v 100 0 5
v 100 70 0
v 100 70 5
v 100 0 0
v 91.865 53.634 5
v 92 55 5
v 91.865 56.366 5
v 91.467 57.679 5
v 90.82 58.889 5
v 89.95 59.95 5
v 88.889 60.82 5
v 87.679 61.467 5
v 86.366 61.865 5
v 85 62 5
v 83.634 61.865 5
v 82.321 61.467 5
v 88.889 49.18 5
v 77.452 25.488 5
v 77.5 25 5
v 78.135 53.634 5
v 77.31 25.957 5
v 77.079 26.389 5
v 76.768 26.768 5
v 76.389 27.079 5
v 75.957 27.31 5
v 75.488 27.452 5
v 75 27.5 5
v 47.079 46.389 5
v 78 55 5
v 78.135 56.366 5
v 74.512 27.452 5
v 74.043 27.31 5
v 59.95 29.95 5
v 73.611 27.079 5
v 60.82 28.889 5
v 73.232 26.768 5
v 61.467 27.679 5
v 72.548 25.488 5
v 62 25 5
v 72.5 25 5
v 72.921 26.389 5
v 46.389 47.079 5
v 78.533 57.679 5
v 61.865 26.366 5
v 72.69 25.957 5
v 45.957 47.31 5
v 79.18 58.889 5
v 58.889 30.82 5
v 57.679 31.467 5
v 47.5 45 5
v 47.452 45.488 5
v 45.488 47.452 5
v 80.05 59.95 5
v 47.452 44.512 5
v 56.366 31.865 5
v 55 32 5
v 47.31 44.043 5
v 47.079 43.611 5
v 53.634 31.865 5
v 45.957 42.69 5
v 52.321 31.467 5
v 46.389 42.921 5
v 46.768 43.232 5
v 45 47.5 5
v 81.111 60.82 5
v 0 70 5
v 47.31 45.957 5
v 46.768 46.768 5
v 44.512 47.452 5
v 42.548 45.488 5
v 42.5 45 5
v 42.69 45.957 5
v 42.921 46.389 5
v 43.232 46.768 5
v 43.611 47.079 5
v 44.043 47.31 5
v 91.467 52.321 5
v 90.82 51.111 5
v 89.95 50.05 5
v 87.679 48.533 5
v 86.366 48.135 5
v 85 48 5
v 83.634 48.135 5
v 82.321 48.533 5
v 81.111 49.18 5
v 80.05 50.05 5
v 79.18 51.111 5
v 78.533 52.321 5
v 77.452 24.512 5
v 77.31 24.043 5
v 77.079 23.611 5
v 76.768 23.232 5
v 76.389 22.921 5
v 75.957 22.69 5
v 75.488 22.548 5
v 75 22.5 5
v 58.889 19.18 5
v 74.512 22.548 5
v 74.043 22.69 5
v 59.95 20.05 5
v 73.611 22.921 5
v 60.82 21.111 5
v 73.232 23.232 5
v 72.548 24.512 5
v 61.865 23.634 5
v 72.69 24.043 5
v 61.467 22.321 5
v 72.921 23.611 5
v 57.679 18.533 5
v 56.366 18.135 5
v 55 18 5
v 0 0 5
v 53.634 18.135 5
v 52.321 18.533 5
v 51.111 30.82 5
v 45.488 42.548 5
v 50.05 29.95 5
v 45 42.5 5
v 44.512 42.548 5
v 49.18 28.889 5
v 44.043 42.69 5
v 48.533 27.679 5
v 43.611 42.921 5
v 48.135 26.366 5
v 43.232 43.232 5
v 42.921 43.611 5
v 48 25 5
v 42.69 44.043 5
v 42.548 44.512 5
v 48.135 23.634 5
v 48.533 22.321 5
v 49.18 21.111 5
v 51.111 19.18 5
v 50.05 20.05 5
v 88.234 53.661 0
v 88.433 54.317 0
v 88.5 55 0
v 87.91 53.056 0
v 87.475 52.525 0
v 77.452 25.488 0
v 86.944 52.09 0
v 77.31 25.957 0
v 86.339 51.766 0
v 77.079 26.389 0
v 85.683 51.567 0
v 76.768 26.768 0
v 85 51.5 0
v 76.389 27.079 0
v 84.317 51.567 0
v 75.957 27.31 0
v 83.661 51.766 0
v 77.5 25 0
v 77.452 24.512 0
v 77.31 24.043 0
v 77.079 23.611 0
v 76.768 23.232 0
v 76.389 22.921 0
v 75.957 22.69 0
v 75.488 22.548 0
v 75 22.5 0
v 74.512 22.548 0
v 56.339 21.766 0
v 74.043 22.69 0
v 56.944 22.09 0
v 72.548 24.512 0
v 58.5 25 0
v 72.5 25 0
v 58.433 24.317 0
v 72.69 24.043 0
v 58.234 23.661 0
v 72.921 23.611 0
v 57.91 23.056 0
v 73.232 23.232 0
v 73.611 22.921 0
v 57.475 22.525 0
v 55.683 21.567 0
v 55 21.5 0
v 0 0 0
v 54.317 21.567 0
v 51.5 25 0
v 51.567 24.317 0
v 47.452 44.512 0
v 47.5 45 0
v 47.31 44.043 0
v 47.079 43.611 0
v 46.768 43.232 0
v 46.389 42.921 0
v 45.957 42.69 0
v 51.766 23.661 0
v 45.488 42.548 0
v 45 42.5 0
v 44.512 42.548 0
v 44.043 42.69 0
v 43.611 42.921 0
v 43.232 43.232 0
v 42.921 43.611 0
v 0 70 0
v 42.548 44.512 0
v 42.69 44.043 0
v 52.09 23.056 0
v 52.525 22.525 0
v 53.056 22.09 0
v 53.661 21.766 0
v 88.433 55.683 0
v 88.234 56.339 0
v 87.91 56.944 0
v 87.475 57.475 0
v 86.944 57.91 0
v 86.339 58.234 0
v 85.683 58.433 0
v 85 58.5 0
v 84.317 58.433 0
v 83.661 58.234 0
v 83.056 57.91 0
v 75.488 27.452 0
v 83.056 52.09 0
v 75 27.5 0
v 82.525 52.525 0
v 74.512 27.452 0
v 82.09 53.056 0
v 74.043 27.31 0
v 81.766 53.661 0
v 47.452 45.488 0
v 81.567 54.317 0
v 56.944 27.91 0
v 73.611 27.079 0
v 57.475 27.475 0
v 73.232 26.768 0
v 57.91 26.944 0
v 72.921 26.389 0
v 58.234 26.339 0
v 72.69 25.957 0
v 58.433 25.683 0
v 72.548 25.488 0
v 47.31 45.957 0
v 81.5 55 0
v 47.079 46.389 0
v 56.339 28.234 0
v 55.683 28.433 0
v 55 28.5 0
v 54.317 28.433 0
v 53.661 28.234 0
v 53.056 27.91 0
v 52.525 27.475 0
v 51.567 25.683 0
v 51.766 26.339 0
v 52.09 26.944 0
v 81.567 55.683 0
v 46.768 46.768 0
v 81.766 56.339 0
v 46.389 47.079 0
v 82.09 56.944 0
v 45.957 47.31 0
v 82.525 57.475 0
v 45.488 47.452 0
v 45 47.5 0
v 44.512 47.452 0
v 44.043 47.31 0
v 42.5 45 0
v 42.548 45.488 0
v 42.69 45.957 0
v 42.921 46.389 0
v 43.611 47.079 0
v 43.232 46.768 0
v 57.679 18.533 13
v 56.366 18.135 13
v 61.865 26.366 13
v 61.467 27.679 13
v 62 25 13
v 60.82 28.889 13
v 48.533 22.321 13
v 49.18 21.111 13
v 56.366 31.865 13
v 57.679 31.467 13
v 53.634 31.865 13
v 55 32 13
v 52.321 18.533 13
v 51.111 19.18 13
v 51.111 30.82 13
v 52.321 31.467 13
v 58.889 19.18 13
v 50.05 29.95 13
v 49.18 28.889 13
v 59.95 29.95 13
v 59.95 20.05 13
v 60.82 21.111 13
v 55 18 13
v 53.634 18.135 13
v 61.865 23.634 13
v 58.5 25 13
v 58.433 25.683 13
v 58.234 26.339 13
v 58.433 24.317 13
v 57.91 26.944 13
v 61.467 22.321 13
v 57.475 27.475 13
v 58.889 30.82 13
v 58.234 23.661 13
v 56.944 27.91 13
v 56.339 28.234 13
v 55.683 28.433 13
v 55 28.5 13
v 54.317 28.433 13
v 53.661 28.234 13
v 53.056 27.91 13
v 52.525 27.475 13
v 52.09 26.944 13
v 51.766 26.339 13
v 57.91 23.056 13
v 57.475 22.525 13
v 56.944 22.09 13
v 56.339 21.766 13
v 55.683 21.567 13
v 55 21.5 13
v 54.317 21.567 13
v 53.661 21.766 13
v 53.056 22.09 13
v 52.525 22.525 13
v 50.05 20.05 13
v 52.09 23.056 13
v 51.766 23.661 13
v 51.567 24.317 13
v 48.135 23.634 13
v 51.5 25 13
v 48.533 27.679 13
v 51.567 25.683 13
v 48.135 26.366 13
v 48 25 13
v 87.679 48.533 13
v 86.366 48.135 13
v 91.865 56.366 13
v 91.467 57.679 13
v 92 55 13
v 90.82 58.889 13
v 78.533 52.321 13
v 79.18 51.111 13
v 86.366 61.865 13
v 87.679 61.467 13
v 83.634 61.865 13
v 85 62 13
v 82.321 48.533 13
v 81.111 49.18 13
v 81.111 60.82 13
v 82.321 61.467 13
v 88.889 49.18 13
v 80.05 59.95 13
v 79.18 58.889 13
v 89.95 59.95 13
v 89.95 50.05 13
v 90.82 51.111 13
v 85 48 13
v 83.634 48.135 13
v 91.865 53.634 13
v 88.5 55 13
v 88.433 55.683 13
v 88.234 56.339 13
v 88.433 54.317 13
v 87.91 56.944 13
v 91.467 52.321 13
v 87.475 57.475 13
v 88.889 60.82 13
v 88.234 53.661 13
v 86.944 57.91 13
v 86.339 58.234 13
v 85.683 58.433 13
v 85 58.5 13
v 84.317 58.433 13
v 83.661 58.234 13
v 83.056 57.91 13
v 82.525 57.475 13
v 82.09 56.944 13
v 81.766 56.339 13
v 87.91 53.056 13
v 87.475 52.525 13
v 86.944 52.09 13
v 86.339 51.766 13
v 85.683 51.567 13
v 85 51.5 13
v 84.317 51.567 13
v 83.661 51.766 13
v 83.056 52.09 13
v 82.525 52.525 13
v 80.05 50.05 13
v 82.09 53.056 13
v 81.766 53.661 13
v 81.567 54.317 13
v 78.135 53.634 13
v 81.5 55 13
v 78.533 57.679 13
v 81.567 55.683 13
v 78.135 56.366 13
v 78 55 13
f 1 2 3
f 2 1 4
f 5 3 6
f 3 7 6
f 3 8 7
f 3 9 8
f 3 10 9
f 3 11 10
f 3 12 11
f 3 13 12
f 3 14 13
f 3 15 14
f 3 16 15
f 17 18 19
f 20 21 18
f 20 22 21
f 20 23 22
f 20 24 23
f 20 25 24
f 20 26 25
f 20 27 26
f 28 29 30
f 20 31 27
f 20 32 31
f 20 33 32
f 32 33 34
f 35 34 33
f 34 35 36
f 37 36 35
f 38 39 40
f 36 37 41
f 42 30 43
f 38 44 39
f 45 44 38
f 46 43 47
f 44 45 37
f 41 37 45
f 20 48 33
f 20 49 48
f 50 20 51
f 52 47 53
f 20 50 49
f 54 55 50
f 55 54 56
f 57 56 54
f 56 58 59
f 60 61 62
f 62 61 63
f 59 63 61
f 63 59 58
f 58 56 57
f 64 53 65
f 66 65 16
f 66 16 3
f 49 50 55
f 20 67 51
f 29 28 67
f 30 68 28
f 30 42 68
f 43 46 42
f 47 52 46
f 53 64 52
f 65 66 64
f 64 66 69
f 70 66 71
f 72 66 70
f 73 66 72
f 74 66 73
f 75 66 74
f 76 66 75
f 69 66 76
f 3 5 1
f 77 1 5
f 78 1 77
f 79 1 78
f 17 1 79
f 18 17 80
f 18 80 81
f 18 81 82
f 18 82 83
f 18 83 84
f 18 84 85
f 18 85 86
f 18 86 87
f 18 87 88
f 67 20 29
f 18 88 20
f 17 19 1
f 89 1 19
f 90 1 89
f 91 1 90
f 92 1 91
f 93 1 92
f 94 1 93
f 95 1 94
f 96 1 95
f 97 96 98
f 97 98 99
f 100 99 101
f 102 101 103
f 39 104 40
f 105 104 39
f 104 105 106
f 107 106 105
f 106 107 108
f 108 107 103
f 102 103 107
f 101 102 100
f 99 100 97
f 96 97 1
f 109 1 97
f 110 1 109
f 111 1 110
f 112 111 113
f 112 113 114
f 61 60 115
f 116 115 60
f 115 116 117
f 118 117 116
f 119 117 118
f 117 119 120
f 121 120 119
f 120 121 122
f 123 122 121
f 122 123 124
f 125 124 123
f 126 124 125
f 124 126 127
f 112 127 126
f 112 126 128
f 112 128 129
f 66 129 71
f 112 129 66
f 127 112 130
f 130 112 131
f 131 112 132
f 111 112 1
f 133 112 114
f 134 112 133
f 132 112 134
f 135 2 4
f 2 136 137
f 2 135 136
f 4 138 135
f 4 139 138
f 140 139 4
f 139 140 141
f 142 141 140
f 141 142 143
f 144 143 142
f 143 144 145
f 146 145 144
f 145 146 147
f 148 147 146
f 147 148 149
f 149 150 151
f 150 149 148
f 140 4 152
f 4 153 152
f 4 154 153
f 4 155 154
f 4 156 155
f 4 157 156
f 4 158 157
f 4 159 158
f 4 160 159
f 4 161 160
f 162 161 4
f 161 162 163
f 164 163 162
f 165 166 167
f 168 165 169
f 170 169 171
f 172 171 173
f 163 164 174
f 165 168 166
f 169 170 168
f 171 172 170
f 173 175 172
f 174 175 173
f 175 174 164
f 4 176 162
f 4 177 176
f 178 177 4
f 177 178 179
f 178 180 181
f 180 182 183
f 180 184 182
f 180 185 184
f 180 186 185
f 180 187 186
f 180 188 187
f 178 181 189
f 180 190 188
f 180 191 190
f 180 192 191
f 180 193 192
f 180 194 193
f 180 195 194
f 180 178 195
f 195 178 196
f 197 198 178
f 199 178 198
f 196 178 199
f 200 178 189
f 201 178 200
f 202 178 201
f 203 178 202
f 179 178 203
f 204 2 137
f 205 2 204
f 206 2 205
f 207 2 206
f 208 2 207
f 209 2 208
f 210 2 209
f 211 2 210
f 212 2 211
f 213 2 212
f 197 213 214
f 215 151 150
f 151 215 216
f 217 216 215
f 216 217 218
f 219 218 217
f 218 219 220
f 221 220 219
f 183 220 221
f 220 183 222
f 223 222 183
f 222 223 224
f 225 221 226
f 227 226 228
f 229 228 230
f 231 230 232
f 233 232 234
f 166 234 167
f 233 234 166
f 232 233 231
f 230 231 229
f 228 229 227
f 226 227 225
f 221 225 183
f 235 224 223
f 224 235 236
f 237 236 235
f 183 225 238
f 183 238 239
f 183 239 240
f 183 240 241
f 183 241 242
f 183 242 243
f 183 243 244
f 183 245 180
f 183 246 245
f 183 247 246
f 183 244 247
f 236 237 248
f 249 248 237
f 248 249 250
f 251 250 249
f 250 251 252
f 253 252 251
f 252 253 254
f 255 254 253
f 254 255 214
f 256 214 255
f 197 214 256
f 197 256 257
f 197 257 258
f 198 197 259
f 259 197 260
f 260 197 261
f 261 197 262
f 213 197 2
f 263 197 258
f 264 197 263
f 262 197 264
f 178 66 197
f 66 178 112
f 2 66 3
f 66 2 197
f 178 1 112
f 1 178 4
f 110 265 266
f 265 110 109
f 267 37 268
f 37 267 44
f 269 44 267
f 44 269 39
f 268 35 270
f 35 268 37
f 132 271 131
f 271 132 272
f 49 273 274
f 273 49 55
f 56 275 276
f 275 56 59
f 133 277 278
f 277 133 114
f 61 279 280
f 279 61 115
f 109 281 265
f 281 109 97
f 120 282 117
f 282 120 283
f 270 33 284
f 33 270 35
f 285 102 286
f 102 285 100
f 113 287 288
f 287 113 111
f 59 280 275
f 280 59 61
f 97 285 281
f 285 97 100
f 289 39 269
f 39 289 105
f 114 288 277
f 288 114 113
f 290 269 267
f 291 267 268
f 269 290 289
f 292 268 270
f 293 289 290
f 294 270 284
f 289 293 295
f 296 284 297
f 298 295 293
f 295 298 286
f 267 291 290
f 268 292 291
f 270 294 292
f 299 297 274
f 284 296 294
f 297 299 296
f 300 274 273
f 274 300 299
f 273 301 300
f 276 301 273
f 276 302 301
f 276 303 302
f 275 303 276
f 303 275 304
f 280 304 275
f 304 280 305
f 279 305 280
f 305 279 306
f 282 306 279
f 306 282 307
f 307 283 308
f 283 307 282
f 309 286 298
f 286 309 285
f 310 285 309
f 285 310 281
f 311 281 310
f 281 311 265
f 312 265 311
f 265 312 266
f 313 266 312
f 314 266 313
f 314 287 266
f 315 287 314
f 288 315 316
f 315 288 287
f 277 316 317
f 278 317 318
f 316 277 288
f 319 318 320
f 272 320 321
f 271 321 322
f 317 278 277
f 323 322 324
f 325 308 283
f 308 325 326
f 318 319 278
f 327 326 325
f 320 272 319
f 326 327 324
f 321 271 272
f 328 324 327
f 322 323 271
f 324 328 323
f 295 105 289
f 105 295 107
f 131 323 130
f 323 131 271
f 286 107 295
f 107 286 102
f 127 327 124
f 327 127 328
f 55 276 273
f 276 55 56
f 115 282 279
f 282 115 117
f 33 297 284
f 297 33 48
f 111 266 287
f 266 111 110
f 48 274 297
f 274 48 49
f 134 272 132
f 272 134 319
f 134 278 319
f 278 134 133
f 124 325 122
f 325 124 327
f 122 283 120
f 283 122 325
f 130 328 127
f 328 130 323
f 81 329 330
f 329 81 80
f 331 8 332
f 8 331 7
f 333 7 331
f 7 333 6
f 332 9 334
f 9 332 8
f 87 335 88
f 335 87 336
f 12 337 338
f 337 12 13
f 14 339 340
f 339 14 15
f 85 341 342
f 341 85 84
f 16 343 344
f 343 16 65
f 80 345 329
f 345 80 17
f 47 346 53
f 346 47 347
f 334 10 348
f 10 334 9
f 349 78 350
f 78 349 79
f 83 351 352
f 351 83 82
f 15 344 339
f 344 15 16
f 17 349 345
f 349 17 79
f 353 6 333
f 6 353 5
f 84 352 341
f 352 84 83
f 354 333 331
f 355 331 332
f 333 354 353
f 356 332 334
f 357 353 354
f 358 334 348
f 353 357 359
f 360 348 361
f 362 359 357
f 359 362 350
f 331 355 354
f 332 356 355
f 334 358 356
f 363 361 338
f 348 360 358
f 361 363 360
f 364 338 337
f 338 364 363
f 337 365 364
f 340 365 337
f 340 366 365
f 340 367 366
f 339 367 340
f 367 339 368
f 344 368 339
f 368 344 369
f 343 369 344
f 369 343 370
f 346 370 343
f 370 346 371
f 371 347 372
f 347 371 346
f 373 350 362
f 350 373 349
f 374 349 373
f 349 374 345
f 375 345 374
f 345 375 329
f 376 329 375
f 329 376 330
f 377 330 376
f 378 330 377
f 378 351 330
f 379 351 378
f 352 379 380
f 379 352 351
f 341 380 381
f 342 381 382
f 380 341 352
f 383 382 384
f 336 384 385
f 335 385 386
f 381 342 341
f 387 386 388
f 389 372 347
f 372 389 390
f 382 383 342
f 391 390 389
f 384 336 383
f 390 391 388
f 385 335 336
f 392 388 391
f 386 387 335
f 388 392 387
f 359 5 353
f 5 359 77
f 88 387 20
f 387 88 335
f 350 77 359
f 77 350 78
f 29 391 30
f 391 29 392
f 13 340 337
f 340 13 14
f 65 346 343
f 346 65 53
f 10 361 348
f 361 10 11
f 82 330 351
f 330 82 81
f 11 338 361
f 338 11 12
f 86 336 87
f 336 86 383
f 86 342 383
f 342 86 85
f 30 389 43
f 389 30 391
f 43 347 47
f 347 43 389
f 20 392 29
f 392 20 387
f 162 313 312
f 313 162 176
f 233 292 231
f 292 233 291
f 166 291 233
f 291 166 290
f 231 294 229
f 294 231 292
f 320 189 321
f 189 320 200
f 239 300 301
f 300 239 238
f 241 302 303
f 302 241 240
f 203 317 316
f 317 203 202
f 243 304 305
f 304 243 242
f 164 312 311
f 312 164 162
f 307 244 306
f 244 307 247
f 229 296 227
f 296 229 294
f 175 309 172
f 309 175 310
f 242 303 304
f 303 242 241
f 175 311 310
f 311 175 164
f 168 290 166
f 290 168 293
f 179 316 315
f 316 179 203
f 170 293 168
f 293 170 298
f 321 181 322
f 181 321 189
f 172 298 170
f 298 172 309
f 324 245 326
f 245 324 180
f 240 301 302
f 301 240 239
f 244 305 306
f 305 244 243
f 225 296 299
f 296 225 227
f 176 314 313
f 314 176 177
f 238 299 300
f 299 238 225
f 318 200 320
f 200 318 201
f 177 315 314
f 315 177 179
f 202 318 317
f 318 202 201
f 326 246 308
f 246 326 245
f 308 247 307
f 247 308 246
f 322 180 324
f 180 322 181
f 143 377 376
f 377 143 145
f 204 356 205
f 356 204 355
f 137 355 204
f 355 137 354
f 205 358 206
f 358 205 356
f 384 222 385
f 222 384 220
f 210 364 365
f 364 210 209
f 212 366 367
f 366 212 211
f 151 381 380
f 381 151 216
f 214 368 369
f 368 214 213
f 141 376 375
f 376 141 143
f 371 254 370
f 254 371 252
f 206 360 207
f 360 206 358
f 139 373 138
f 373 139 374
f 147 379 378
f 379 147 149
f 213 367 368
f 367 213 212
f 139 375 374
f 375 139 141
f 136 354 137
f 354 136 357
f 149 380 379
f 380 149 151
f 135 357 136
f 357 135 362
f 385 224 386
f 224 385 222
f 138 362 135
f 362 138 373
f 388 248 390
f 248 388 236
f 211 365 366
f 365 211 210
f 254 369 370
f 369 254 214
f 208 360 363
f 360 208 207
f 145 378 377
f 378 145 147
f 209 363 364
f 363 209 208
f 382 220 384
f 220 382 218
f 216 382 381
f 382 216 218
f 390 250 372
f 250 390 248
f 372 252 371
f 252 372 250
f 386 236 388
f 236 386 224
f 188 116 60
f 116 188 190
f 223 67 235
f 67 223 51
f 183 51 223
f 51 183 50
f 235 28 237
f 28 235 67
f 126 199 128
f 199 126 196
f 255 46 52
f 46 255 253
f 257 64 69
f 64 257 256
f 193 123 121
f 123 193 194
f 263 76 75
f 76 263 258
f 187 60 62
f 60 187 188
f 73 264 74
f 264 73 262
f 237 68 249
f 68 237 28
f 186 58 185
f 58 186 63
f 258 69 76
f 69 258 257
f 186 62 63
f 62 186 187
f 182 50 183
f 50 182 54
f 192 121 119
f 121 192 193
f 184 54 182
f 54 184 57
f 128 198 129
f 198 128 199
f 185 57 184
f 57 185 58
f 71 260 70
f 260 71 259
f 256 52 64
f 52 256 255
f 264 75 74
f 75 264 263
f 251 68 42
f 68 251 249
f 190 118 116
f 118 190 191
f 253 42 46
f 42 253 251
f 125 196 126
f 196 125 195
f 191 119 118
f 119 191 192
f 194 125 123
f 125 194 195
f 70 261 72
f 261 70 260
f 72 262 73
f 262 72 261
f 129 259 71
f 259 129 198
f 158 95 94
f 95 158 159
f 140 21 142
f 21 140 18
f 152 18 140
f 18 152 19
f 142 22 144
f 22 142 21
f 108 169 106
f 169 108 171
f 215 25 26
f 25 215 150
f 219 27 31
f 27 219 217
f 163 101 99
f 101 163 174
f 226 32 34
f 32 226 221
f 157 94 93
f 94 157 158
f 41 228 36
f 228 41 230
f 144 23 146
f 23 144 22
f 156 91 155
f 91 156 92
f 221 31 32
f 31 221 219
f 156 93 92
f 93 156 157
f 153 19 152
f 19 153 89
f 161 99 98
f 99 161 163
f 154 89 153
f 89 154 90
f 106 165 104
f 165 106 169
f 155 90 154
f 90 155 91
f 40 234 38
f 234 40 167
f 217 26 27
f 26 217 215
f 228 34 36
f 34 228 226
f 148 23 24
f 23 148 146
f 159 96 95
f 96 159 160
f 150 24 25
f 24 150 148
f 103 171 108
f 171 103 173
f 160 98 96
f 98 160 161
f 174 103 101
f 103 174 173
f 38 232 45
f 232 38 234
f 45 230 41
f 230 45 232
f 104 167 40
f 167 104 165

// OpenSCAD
$fn = 32;

// ----------------------------------------------------------------------
// Mixed field: bosses and holes at given coordinates
// ----------------------------------------------------------------------

// --- parameters (mm) ---
plate_l = 100;            // plate length, X
plate_w = 70;             // plate width, Y
plate_t = 5;              // plate thickness, Z
boss_d = 14;              // boss diameter
boss_h = 8;               // boss height above the plate
hole_d = 5;               // through hole diameter

total_h = plate_t + boss_h;  // overall height

difference() {
  union() {
    cube([plate_l, plate_w, plate_t]);
    translate([55, 25, plate_t]) cylinder(h = boss_h, d = boss_d);
    translate([85, 55, plate_t]) cylinder(h = boss_h, d = boss_d);
  }
  translate([55, 25, -1]) cylinder(h = total_h + 2, d = boss_d / 2);
  translate([85, 55, -1]) cylinder(h = total_h + 2, d = boss_d / 2);
  translate([45, 45, -1]) cylinder(h = plate_t + 2, d = hole_d);
  translate([75, 25, -1]) cylinder(h = plate_t + 2, d = hole_d);
}
